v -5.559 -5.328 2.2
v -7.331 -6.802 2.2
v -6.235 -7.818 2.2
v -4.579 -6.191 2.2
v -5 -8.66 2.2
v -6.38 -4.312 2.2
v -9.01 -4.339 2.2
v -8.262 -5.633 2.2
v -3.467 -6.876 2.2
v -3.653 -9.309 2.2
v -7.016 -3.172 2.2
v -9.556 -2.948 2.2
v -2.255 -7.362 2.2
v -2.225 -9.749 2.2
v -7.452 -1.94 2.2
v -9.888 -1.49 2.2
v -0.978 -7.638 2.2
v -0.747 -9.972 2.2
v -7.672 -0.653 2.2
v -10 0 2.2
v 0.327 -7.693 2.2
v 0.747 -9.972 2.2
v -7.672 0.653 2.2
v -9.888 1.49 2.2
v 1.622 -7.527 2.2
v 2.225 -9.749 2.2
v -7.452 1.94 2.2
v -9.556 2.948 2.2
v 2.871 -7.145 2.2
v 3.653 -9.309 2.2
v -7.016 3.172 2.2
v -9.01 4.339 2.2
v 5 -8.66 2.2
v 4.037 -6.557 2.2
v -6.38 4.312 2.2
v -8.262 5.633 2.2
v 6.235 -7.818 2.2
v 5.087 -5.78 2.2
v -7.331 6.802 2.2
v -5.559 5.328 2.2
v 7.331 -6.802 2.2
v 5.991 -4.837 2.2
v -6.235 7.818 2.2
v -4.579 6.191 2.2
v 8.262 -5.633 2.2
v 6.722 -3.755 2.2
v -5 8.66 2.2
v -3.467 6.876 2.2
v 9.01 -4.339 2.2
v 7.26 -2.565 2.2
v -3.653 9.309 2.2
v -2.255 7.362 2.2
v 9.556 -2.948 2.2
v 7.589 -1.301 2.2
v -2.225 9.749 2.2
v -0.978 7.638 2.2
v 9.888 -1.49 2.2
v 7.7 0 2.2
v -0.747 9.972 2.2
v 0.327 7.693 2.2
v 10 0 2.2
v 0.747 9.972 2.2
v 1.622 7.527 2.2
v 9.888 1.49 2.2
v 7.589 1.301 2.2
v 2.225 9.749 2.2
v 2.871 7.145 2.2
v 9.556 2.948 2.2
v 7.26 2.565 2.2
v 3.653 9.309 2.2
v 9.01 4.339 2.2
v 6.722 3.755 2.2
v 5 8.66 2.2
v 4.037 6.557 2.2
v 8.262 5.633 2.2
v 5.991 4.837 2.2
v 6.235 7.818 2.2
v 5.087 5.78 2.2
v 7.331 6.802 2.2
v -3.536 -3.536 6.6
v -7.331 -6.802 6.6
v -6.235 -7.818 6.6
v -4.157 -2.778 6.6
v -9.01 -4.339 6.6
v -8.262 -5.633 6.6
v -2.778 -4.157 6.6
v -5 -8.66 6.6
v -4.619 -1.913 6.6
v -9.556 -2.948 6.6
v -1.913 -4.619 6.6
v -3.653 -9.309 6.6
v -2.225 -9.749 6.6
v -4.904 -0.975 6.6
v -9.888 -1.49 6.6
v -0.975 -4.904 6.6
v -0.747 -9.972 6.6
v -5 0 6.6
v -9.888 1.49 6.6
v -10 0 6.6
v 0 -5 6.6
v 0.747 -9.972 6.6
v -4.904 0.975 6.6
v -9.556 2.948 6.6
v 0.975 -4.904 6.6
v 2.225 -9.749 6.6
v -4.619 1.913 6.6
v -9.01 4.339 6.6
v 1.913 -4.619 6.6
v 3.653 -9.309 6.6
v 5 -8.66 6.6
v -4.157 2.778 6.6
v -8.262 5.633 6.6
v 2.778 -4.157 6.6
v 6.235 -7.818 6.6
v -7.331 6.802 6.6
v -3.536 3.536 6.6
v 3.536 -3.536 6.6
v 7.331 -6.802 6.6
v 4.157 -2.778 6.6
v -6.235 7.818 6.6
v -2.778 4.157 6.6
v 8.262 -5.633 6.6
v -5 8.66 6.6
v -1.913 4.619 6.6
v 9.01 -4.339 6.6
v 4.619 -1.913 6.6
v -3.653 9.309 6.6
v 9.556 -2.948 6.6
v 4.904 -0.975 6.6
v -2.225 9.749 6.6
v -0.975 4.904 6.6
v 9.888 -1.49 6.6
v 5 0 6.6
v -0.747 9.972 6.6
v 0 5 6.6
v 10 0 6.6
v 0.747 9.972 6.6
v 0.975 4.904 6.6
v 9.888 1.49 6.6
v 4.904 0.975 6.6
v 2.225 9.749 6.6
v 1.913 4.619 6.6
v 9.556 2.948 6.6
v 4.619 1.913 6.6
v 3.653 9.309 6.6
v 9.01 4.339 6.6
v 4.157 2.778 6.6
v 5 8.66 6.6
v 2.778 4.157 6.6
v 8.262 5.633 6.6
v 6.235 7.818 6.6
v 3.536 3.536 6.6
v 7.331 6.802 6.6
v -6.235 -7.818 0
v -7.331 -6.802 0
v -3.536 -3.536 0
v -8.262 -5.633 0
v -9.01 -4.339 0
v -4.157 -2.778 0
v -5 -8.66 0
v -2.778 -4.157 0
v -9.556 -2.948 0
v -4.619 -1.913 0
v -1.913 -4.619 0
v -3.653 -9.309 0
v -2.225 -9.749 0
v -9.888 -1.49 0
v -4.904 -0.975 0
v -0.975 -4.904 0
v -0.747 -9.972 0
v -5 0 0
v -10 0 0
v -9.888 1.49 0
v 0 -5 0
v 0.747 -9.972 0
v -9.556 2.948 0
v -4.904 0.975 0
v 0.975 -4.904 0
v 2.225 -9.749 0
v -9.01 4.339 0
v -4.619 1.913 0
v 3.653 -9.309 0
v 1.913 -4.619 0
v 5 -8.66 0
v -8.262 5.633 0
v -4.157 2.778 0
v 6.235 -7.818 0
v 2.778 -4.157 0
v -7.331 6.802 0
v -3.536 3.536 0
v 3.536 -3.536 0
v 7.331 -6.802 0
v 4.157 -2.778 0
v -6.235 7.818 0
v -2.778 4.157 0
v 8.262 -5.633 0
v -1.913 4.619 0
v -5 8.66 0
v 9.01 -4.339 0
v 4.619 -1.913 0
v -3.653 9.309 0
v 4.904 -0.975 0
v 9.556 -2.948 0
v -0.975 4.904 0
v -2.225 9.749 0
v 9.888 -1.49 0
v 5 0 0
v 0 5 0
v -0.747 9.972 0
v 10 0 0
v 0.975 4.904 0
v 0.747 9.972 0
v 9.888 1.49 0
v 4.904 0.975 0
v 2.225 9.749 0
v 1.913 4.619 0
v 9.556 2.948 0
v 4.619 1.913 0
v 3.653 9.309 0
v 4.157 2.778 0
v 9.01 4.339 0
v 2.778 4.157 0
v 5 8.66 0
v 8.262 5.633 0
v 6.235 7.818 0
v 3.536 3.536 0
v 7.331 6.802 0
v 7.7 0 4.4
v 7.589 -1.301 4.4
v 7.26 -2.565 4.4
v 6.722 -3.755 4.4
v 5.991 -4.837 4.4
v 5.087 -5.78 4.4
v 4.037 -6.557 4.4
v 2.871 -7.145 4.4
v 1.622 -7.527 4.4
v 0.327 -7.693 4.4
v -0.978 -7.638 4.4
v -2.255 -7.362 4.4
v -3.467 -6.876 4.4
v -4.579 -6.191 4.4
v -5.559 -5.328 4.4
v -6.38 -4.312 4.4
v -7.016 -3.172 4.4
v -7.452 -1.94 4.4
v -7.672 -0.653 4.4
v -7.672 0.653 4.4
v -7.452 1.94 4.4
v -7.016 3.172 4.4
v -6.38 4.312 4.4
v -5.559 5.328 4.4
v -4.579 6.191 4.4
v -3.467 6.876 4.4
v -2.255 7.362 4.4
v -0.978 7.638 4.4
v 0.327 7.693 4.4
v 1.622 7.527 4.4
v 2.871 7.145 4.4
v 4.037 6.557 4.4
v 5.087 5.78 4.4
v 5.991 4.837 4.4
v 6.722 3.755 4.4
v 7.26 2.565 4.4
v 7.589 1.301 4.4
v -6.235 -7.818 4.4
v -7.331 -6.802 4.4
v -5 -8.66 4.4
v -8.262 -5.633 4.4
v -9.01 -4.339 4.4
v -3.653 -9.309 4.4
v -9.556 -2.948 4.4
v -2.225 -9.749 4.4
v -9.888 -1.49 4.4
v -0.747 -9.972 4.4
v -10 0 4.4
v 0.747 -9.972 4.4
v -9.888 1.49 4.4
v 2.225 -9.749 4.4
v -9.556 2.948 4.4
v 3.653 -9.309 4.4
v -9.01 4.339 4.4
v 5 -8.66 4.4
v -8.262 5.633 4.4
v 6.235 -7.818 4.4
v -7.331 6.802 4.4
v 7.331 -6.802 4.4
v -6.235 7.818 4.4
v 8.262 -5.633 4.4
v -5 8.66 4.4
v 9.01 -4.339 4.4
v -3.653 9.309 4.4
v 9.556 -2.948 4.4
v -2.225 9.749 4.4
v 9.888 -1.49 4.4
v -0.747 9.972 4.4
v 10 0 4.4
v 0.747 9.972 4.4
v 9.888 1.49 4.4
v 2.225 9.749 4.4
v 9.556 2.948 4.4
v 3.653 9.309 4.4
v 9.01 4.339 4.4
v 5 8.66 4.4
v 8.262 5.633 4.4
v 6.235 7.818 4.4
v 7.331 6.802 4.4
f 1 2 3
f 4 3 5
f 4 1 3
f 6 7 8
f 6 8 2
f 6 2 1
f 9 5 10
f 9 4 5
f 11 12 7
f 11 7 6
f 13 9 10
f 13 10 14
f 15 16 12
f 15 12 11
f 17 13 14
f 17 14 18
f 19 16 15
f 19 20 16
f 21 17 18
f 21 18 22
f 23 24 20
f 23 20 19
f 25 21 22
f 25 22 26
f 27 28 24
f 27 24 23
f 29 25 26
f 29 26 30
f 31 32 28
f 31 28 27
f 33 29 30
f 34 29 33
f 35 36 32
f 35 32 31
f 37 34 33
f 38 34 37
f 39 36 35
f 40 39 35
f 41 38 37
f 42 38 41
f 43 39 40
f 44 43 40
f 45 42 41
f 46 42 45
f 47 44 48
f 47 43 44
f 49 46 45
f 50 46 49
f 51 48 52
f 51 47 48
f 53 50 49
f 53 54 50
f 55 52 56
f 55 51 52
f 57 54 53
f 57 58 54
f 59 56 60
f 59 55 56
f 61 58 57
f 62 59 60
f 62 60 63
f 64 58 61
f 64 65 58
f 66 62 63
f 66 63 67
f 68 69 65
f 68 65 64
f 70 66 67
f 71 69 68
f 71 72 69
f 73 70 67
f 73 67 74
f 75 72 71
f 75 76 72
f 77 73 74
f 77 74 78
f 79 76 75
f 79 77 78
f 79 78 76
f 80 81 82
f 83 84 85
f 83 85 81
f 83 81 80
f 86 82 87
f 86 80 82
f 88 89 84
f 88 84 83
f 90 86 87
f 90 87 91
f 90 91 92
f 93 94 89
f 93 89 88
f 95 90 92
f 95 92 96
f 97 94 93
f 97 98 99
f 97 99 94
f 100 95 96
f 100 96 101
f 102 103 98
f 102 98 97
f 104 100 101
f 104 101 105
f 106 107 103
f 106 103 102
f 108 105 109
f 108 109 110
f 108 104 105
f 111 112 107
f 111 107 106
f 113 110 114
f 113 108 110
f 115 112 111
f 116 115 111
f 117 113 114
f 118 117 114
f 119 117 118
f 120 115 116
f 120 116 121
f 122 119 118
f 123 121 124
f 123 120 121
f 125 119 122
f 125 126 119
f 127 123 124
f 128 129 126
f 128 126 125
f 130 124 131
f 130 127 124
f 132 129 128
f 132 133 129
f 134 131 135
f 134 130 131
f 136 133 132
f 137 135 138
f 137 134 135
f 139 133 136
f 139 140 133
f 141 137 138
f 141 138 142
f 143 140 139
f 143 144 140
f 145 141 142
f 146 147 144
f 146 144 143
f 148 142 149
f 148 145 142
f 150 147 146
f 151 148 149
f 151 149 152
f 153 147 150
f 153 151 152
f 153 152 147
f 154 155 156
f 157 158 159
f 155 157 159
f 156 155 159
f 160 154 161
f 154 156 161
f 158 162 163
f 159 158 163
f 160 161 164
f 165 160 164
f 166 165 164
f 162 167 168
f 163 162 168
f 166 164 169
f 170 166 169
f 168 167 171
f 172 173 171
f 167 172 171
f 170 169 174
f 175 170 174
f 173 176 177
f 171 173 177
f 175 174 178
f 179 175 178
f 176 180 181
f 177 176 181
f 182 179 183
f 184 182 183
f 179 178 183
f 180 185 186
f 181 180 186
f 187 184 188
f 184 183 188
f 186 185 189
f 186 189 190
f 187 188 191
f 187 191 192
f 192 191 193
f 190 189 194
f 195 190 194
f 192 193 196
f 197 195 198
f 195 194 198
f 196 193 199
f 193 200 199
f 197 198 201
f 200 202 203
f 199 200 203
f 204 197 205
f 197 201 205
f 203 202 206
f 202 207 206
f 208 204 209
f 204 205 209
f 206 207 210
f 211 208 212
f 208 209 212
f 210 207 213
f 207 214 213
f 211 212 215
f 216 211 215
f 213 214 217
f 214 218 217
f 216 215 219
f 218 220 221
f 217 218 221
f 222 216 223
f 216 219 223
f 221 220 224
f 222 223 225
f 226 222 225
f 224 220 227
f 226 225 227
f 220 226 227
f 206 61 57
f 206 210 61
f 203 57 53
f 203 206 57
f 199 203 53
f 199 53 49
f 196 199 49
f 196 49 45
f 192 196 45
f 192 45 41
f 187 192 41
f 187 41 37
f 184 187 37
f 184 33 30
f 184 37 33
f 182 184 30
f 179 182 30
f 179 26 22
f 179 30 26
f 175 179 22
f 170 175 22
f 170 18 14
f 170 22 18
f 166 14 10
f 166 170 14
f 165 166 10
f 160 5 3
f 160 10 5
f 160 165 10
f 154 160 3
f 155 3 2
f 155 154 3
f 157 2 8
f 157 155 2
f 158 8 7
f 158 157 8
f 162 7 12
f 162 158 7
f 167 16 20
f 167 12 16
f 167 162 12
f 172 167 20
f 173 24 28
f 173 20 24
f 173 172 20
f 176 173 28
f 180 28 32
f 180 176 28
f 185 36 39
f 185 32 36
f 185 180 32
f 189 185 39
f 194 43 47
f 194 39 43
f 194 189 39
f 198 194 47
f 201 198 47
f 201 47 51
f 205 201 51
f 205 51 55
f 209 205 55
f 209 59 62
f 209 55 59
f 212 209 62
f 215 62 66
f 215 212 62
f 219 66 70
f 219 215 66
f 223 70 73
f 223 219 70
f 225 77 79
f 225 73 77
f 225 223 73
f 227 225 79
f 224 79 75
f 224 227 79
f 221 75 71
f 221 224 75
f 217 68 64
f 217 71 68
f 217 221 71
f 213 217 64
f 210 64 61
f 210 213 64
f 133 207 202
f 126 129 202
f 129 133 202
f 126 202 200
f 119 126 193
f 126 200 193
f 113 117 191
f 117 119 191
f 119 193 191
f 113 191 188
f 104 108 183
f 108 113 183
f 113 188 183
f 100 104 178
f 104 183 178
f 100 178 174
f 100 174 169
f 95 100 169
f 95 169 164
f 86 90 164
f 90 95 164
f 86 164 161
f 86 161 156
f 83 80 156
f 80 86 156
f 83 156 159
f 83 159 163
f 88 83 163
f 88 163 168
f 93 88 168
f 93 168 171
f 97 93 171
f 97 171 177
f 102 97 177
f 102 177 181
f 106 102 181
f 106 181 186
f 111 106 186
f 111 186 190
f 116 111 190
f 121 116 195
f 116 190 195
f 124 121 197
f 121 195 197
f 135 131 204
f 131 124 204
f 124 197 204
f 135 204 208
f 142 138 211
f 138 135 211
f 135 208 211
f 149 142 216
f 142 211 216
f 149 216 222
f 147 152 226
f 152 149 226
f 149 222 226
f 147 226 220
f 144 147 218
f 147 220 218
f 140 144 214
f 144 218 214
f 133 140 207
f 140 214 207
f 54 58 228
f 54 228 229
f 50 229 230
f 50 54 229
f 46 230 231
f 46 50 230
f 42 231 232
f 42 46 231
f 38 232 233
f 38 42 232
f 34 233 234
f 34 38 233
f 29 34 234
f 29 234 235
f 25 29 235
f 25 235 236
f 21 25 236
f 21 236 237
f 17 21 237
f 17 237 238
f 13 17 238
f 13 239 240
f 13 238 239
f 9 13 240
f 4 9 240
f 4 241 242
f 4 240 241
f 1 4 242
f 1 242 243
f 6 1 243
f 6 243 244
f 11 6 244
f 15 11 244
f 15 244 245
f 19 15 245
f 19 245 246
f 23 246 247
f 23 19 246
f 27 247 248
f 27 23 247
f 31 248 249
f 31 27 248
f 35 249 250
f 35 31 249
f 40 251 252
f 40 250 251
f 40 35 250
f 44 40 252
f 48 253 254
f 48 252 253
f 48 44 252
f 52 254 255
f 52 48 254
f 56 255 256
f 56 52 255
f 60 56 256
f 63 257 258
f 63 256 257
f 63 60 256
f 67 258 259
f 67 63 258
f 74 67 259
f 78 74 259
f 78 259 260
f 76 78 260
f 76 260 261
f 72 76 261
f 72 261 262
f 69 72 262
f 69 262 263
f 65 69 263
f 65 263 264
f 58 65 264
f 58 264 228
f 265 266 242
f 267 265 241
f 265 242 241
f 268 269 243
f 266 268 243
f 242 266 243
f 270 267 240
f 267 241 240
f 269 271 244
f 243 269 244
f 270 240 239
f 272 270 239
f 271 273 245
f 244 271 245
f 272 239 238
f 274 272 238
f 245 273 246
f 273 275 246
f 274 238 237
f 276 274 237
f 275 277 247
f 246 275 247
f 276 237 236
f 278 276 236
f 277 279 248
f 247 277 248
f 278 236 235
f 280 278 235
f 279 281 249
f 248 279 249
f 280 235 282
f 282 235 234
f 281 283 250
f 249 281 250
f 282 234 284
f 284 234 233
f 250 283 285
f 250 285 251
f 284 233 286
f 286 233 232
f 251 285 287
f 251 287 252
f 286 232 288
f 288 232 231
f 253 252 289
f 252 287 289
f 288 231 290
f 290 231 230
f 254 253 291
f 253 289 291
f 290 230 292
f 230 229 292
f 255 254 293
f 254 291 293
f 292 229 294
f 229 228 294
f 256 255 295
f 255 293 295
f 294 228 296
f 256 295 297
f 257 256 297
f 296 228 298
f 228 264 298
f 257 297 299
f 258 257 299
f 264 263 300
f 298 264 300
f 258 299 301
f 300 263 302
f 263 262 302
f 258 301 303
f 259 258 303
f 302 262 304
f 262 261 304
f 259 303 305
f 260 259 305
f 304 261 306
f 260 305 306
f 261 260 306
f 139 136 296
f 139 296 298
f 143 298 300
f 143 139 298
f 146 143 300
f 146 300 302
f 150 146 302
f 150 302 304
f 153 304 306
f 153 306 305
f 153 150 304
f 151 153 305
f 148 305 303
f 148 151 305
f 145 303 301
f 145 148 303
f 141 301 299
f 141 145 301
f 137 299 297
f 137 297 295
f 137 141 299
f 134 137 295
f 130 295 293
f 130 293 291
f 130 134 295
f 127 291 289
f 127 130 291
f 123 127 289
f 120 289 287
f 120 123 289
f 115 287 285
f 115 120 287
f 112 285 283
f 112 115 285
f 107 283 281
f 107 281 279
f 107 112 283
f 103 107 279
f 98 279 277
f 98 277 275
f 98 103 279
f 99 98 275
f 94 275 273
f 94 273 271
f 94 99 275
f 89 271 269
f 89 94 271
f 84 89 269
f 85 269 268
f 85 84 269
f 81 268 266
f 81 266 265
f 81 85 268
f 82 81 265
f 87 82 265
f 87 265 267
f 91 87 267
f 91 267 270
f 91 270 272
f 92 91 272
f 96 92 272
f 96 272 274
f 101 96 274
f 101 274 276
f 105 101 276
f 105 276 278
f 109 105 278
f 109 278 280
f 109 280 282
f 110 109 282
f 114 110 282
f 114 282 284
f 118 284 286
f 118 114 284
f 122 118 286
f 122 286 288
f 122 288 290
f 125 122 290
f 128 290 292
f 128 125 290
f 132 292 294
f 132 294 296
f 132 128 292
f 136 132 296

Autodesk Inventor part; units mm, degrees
ref_plane "YZ Plane" through (0, 0, 0) normal (1, 0, 0) x (0, 1, 0)
ref_plane "XZ Plane" through (0, 0, 0) normal (0, 1, 0) x (-1, 0, 0)
ref_plane "XY Plane" through (0, 0, 0) normal (0, 0, 1) x (1, 0, 0)
sketch "Sketch1" plane through (0, 0, 0) normal (0, 0, 1) x (1, 0, 0)
  circle A0 centre (0, 0) radius 5
  circle A1 centre (0, 0) radius 10
  dimension "d0" = 10
  dimension "d1" = 20
extrude "Extrusion1" add sketch "Sketch1" along normal blind 2.2
sketch "Sketch2" plane through (0, 0, 2.2) normal (0, 0, 1) x (1, 0, 0)
  circle A0 centre (0, 0) radius 5 projected
  circle A1 centre (0, 0) radius 10 projected
  circle A2 centre (0, 0) radius 7.7
  dimension "d4" = 15.4
extrude "Extrusion2" add sketch "Sketch2" along normal blind 4.4 contours A2
sketch "Sketch3" plane through (0, 0, 6.6) normal (0, 0, 1) x (1, 0, 0)
  circle A0 centre (0, 0) radius 7.7 projected
  circle A1 centre (0, 0) radius 10
extrude "Extrusion3" add sketch "Sketch3" against normal blind 2.2
properties part number "pulley_wheel" material "Steel"
